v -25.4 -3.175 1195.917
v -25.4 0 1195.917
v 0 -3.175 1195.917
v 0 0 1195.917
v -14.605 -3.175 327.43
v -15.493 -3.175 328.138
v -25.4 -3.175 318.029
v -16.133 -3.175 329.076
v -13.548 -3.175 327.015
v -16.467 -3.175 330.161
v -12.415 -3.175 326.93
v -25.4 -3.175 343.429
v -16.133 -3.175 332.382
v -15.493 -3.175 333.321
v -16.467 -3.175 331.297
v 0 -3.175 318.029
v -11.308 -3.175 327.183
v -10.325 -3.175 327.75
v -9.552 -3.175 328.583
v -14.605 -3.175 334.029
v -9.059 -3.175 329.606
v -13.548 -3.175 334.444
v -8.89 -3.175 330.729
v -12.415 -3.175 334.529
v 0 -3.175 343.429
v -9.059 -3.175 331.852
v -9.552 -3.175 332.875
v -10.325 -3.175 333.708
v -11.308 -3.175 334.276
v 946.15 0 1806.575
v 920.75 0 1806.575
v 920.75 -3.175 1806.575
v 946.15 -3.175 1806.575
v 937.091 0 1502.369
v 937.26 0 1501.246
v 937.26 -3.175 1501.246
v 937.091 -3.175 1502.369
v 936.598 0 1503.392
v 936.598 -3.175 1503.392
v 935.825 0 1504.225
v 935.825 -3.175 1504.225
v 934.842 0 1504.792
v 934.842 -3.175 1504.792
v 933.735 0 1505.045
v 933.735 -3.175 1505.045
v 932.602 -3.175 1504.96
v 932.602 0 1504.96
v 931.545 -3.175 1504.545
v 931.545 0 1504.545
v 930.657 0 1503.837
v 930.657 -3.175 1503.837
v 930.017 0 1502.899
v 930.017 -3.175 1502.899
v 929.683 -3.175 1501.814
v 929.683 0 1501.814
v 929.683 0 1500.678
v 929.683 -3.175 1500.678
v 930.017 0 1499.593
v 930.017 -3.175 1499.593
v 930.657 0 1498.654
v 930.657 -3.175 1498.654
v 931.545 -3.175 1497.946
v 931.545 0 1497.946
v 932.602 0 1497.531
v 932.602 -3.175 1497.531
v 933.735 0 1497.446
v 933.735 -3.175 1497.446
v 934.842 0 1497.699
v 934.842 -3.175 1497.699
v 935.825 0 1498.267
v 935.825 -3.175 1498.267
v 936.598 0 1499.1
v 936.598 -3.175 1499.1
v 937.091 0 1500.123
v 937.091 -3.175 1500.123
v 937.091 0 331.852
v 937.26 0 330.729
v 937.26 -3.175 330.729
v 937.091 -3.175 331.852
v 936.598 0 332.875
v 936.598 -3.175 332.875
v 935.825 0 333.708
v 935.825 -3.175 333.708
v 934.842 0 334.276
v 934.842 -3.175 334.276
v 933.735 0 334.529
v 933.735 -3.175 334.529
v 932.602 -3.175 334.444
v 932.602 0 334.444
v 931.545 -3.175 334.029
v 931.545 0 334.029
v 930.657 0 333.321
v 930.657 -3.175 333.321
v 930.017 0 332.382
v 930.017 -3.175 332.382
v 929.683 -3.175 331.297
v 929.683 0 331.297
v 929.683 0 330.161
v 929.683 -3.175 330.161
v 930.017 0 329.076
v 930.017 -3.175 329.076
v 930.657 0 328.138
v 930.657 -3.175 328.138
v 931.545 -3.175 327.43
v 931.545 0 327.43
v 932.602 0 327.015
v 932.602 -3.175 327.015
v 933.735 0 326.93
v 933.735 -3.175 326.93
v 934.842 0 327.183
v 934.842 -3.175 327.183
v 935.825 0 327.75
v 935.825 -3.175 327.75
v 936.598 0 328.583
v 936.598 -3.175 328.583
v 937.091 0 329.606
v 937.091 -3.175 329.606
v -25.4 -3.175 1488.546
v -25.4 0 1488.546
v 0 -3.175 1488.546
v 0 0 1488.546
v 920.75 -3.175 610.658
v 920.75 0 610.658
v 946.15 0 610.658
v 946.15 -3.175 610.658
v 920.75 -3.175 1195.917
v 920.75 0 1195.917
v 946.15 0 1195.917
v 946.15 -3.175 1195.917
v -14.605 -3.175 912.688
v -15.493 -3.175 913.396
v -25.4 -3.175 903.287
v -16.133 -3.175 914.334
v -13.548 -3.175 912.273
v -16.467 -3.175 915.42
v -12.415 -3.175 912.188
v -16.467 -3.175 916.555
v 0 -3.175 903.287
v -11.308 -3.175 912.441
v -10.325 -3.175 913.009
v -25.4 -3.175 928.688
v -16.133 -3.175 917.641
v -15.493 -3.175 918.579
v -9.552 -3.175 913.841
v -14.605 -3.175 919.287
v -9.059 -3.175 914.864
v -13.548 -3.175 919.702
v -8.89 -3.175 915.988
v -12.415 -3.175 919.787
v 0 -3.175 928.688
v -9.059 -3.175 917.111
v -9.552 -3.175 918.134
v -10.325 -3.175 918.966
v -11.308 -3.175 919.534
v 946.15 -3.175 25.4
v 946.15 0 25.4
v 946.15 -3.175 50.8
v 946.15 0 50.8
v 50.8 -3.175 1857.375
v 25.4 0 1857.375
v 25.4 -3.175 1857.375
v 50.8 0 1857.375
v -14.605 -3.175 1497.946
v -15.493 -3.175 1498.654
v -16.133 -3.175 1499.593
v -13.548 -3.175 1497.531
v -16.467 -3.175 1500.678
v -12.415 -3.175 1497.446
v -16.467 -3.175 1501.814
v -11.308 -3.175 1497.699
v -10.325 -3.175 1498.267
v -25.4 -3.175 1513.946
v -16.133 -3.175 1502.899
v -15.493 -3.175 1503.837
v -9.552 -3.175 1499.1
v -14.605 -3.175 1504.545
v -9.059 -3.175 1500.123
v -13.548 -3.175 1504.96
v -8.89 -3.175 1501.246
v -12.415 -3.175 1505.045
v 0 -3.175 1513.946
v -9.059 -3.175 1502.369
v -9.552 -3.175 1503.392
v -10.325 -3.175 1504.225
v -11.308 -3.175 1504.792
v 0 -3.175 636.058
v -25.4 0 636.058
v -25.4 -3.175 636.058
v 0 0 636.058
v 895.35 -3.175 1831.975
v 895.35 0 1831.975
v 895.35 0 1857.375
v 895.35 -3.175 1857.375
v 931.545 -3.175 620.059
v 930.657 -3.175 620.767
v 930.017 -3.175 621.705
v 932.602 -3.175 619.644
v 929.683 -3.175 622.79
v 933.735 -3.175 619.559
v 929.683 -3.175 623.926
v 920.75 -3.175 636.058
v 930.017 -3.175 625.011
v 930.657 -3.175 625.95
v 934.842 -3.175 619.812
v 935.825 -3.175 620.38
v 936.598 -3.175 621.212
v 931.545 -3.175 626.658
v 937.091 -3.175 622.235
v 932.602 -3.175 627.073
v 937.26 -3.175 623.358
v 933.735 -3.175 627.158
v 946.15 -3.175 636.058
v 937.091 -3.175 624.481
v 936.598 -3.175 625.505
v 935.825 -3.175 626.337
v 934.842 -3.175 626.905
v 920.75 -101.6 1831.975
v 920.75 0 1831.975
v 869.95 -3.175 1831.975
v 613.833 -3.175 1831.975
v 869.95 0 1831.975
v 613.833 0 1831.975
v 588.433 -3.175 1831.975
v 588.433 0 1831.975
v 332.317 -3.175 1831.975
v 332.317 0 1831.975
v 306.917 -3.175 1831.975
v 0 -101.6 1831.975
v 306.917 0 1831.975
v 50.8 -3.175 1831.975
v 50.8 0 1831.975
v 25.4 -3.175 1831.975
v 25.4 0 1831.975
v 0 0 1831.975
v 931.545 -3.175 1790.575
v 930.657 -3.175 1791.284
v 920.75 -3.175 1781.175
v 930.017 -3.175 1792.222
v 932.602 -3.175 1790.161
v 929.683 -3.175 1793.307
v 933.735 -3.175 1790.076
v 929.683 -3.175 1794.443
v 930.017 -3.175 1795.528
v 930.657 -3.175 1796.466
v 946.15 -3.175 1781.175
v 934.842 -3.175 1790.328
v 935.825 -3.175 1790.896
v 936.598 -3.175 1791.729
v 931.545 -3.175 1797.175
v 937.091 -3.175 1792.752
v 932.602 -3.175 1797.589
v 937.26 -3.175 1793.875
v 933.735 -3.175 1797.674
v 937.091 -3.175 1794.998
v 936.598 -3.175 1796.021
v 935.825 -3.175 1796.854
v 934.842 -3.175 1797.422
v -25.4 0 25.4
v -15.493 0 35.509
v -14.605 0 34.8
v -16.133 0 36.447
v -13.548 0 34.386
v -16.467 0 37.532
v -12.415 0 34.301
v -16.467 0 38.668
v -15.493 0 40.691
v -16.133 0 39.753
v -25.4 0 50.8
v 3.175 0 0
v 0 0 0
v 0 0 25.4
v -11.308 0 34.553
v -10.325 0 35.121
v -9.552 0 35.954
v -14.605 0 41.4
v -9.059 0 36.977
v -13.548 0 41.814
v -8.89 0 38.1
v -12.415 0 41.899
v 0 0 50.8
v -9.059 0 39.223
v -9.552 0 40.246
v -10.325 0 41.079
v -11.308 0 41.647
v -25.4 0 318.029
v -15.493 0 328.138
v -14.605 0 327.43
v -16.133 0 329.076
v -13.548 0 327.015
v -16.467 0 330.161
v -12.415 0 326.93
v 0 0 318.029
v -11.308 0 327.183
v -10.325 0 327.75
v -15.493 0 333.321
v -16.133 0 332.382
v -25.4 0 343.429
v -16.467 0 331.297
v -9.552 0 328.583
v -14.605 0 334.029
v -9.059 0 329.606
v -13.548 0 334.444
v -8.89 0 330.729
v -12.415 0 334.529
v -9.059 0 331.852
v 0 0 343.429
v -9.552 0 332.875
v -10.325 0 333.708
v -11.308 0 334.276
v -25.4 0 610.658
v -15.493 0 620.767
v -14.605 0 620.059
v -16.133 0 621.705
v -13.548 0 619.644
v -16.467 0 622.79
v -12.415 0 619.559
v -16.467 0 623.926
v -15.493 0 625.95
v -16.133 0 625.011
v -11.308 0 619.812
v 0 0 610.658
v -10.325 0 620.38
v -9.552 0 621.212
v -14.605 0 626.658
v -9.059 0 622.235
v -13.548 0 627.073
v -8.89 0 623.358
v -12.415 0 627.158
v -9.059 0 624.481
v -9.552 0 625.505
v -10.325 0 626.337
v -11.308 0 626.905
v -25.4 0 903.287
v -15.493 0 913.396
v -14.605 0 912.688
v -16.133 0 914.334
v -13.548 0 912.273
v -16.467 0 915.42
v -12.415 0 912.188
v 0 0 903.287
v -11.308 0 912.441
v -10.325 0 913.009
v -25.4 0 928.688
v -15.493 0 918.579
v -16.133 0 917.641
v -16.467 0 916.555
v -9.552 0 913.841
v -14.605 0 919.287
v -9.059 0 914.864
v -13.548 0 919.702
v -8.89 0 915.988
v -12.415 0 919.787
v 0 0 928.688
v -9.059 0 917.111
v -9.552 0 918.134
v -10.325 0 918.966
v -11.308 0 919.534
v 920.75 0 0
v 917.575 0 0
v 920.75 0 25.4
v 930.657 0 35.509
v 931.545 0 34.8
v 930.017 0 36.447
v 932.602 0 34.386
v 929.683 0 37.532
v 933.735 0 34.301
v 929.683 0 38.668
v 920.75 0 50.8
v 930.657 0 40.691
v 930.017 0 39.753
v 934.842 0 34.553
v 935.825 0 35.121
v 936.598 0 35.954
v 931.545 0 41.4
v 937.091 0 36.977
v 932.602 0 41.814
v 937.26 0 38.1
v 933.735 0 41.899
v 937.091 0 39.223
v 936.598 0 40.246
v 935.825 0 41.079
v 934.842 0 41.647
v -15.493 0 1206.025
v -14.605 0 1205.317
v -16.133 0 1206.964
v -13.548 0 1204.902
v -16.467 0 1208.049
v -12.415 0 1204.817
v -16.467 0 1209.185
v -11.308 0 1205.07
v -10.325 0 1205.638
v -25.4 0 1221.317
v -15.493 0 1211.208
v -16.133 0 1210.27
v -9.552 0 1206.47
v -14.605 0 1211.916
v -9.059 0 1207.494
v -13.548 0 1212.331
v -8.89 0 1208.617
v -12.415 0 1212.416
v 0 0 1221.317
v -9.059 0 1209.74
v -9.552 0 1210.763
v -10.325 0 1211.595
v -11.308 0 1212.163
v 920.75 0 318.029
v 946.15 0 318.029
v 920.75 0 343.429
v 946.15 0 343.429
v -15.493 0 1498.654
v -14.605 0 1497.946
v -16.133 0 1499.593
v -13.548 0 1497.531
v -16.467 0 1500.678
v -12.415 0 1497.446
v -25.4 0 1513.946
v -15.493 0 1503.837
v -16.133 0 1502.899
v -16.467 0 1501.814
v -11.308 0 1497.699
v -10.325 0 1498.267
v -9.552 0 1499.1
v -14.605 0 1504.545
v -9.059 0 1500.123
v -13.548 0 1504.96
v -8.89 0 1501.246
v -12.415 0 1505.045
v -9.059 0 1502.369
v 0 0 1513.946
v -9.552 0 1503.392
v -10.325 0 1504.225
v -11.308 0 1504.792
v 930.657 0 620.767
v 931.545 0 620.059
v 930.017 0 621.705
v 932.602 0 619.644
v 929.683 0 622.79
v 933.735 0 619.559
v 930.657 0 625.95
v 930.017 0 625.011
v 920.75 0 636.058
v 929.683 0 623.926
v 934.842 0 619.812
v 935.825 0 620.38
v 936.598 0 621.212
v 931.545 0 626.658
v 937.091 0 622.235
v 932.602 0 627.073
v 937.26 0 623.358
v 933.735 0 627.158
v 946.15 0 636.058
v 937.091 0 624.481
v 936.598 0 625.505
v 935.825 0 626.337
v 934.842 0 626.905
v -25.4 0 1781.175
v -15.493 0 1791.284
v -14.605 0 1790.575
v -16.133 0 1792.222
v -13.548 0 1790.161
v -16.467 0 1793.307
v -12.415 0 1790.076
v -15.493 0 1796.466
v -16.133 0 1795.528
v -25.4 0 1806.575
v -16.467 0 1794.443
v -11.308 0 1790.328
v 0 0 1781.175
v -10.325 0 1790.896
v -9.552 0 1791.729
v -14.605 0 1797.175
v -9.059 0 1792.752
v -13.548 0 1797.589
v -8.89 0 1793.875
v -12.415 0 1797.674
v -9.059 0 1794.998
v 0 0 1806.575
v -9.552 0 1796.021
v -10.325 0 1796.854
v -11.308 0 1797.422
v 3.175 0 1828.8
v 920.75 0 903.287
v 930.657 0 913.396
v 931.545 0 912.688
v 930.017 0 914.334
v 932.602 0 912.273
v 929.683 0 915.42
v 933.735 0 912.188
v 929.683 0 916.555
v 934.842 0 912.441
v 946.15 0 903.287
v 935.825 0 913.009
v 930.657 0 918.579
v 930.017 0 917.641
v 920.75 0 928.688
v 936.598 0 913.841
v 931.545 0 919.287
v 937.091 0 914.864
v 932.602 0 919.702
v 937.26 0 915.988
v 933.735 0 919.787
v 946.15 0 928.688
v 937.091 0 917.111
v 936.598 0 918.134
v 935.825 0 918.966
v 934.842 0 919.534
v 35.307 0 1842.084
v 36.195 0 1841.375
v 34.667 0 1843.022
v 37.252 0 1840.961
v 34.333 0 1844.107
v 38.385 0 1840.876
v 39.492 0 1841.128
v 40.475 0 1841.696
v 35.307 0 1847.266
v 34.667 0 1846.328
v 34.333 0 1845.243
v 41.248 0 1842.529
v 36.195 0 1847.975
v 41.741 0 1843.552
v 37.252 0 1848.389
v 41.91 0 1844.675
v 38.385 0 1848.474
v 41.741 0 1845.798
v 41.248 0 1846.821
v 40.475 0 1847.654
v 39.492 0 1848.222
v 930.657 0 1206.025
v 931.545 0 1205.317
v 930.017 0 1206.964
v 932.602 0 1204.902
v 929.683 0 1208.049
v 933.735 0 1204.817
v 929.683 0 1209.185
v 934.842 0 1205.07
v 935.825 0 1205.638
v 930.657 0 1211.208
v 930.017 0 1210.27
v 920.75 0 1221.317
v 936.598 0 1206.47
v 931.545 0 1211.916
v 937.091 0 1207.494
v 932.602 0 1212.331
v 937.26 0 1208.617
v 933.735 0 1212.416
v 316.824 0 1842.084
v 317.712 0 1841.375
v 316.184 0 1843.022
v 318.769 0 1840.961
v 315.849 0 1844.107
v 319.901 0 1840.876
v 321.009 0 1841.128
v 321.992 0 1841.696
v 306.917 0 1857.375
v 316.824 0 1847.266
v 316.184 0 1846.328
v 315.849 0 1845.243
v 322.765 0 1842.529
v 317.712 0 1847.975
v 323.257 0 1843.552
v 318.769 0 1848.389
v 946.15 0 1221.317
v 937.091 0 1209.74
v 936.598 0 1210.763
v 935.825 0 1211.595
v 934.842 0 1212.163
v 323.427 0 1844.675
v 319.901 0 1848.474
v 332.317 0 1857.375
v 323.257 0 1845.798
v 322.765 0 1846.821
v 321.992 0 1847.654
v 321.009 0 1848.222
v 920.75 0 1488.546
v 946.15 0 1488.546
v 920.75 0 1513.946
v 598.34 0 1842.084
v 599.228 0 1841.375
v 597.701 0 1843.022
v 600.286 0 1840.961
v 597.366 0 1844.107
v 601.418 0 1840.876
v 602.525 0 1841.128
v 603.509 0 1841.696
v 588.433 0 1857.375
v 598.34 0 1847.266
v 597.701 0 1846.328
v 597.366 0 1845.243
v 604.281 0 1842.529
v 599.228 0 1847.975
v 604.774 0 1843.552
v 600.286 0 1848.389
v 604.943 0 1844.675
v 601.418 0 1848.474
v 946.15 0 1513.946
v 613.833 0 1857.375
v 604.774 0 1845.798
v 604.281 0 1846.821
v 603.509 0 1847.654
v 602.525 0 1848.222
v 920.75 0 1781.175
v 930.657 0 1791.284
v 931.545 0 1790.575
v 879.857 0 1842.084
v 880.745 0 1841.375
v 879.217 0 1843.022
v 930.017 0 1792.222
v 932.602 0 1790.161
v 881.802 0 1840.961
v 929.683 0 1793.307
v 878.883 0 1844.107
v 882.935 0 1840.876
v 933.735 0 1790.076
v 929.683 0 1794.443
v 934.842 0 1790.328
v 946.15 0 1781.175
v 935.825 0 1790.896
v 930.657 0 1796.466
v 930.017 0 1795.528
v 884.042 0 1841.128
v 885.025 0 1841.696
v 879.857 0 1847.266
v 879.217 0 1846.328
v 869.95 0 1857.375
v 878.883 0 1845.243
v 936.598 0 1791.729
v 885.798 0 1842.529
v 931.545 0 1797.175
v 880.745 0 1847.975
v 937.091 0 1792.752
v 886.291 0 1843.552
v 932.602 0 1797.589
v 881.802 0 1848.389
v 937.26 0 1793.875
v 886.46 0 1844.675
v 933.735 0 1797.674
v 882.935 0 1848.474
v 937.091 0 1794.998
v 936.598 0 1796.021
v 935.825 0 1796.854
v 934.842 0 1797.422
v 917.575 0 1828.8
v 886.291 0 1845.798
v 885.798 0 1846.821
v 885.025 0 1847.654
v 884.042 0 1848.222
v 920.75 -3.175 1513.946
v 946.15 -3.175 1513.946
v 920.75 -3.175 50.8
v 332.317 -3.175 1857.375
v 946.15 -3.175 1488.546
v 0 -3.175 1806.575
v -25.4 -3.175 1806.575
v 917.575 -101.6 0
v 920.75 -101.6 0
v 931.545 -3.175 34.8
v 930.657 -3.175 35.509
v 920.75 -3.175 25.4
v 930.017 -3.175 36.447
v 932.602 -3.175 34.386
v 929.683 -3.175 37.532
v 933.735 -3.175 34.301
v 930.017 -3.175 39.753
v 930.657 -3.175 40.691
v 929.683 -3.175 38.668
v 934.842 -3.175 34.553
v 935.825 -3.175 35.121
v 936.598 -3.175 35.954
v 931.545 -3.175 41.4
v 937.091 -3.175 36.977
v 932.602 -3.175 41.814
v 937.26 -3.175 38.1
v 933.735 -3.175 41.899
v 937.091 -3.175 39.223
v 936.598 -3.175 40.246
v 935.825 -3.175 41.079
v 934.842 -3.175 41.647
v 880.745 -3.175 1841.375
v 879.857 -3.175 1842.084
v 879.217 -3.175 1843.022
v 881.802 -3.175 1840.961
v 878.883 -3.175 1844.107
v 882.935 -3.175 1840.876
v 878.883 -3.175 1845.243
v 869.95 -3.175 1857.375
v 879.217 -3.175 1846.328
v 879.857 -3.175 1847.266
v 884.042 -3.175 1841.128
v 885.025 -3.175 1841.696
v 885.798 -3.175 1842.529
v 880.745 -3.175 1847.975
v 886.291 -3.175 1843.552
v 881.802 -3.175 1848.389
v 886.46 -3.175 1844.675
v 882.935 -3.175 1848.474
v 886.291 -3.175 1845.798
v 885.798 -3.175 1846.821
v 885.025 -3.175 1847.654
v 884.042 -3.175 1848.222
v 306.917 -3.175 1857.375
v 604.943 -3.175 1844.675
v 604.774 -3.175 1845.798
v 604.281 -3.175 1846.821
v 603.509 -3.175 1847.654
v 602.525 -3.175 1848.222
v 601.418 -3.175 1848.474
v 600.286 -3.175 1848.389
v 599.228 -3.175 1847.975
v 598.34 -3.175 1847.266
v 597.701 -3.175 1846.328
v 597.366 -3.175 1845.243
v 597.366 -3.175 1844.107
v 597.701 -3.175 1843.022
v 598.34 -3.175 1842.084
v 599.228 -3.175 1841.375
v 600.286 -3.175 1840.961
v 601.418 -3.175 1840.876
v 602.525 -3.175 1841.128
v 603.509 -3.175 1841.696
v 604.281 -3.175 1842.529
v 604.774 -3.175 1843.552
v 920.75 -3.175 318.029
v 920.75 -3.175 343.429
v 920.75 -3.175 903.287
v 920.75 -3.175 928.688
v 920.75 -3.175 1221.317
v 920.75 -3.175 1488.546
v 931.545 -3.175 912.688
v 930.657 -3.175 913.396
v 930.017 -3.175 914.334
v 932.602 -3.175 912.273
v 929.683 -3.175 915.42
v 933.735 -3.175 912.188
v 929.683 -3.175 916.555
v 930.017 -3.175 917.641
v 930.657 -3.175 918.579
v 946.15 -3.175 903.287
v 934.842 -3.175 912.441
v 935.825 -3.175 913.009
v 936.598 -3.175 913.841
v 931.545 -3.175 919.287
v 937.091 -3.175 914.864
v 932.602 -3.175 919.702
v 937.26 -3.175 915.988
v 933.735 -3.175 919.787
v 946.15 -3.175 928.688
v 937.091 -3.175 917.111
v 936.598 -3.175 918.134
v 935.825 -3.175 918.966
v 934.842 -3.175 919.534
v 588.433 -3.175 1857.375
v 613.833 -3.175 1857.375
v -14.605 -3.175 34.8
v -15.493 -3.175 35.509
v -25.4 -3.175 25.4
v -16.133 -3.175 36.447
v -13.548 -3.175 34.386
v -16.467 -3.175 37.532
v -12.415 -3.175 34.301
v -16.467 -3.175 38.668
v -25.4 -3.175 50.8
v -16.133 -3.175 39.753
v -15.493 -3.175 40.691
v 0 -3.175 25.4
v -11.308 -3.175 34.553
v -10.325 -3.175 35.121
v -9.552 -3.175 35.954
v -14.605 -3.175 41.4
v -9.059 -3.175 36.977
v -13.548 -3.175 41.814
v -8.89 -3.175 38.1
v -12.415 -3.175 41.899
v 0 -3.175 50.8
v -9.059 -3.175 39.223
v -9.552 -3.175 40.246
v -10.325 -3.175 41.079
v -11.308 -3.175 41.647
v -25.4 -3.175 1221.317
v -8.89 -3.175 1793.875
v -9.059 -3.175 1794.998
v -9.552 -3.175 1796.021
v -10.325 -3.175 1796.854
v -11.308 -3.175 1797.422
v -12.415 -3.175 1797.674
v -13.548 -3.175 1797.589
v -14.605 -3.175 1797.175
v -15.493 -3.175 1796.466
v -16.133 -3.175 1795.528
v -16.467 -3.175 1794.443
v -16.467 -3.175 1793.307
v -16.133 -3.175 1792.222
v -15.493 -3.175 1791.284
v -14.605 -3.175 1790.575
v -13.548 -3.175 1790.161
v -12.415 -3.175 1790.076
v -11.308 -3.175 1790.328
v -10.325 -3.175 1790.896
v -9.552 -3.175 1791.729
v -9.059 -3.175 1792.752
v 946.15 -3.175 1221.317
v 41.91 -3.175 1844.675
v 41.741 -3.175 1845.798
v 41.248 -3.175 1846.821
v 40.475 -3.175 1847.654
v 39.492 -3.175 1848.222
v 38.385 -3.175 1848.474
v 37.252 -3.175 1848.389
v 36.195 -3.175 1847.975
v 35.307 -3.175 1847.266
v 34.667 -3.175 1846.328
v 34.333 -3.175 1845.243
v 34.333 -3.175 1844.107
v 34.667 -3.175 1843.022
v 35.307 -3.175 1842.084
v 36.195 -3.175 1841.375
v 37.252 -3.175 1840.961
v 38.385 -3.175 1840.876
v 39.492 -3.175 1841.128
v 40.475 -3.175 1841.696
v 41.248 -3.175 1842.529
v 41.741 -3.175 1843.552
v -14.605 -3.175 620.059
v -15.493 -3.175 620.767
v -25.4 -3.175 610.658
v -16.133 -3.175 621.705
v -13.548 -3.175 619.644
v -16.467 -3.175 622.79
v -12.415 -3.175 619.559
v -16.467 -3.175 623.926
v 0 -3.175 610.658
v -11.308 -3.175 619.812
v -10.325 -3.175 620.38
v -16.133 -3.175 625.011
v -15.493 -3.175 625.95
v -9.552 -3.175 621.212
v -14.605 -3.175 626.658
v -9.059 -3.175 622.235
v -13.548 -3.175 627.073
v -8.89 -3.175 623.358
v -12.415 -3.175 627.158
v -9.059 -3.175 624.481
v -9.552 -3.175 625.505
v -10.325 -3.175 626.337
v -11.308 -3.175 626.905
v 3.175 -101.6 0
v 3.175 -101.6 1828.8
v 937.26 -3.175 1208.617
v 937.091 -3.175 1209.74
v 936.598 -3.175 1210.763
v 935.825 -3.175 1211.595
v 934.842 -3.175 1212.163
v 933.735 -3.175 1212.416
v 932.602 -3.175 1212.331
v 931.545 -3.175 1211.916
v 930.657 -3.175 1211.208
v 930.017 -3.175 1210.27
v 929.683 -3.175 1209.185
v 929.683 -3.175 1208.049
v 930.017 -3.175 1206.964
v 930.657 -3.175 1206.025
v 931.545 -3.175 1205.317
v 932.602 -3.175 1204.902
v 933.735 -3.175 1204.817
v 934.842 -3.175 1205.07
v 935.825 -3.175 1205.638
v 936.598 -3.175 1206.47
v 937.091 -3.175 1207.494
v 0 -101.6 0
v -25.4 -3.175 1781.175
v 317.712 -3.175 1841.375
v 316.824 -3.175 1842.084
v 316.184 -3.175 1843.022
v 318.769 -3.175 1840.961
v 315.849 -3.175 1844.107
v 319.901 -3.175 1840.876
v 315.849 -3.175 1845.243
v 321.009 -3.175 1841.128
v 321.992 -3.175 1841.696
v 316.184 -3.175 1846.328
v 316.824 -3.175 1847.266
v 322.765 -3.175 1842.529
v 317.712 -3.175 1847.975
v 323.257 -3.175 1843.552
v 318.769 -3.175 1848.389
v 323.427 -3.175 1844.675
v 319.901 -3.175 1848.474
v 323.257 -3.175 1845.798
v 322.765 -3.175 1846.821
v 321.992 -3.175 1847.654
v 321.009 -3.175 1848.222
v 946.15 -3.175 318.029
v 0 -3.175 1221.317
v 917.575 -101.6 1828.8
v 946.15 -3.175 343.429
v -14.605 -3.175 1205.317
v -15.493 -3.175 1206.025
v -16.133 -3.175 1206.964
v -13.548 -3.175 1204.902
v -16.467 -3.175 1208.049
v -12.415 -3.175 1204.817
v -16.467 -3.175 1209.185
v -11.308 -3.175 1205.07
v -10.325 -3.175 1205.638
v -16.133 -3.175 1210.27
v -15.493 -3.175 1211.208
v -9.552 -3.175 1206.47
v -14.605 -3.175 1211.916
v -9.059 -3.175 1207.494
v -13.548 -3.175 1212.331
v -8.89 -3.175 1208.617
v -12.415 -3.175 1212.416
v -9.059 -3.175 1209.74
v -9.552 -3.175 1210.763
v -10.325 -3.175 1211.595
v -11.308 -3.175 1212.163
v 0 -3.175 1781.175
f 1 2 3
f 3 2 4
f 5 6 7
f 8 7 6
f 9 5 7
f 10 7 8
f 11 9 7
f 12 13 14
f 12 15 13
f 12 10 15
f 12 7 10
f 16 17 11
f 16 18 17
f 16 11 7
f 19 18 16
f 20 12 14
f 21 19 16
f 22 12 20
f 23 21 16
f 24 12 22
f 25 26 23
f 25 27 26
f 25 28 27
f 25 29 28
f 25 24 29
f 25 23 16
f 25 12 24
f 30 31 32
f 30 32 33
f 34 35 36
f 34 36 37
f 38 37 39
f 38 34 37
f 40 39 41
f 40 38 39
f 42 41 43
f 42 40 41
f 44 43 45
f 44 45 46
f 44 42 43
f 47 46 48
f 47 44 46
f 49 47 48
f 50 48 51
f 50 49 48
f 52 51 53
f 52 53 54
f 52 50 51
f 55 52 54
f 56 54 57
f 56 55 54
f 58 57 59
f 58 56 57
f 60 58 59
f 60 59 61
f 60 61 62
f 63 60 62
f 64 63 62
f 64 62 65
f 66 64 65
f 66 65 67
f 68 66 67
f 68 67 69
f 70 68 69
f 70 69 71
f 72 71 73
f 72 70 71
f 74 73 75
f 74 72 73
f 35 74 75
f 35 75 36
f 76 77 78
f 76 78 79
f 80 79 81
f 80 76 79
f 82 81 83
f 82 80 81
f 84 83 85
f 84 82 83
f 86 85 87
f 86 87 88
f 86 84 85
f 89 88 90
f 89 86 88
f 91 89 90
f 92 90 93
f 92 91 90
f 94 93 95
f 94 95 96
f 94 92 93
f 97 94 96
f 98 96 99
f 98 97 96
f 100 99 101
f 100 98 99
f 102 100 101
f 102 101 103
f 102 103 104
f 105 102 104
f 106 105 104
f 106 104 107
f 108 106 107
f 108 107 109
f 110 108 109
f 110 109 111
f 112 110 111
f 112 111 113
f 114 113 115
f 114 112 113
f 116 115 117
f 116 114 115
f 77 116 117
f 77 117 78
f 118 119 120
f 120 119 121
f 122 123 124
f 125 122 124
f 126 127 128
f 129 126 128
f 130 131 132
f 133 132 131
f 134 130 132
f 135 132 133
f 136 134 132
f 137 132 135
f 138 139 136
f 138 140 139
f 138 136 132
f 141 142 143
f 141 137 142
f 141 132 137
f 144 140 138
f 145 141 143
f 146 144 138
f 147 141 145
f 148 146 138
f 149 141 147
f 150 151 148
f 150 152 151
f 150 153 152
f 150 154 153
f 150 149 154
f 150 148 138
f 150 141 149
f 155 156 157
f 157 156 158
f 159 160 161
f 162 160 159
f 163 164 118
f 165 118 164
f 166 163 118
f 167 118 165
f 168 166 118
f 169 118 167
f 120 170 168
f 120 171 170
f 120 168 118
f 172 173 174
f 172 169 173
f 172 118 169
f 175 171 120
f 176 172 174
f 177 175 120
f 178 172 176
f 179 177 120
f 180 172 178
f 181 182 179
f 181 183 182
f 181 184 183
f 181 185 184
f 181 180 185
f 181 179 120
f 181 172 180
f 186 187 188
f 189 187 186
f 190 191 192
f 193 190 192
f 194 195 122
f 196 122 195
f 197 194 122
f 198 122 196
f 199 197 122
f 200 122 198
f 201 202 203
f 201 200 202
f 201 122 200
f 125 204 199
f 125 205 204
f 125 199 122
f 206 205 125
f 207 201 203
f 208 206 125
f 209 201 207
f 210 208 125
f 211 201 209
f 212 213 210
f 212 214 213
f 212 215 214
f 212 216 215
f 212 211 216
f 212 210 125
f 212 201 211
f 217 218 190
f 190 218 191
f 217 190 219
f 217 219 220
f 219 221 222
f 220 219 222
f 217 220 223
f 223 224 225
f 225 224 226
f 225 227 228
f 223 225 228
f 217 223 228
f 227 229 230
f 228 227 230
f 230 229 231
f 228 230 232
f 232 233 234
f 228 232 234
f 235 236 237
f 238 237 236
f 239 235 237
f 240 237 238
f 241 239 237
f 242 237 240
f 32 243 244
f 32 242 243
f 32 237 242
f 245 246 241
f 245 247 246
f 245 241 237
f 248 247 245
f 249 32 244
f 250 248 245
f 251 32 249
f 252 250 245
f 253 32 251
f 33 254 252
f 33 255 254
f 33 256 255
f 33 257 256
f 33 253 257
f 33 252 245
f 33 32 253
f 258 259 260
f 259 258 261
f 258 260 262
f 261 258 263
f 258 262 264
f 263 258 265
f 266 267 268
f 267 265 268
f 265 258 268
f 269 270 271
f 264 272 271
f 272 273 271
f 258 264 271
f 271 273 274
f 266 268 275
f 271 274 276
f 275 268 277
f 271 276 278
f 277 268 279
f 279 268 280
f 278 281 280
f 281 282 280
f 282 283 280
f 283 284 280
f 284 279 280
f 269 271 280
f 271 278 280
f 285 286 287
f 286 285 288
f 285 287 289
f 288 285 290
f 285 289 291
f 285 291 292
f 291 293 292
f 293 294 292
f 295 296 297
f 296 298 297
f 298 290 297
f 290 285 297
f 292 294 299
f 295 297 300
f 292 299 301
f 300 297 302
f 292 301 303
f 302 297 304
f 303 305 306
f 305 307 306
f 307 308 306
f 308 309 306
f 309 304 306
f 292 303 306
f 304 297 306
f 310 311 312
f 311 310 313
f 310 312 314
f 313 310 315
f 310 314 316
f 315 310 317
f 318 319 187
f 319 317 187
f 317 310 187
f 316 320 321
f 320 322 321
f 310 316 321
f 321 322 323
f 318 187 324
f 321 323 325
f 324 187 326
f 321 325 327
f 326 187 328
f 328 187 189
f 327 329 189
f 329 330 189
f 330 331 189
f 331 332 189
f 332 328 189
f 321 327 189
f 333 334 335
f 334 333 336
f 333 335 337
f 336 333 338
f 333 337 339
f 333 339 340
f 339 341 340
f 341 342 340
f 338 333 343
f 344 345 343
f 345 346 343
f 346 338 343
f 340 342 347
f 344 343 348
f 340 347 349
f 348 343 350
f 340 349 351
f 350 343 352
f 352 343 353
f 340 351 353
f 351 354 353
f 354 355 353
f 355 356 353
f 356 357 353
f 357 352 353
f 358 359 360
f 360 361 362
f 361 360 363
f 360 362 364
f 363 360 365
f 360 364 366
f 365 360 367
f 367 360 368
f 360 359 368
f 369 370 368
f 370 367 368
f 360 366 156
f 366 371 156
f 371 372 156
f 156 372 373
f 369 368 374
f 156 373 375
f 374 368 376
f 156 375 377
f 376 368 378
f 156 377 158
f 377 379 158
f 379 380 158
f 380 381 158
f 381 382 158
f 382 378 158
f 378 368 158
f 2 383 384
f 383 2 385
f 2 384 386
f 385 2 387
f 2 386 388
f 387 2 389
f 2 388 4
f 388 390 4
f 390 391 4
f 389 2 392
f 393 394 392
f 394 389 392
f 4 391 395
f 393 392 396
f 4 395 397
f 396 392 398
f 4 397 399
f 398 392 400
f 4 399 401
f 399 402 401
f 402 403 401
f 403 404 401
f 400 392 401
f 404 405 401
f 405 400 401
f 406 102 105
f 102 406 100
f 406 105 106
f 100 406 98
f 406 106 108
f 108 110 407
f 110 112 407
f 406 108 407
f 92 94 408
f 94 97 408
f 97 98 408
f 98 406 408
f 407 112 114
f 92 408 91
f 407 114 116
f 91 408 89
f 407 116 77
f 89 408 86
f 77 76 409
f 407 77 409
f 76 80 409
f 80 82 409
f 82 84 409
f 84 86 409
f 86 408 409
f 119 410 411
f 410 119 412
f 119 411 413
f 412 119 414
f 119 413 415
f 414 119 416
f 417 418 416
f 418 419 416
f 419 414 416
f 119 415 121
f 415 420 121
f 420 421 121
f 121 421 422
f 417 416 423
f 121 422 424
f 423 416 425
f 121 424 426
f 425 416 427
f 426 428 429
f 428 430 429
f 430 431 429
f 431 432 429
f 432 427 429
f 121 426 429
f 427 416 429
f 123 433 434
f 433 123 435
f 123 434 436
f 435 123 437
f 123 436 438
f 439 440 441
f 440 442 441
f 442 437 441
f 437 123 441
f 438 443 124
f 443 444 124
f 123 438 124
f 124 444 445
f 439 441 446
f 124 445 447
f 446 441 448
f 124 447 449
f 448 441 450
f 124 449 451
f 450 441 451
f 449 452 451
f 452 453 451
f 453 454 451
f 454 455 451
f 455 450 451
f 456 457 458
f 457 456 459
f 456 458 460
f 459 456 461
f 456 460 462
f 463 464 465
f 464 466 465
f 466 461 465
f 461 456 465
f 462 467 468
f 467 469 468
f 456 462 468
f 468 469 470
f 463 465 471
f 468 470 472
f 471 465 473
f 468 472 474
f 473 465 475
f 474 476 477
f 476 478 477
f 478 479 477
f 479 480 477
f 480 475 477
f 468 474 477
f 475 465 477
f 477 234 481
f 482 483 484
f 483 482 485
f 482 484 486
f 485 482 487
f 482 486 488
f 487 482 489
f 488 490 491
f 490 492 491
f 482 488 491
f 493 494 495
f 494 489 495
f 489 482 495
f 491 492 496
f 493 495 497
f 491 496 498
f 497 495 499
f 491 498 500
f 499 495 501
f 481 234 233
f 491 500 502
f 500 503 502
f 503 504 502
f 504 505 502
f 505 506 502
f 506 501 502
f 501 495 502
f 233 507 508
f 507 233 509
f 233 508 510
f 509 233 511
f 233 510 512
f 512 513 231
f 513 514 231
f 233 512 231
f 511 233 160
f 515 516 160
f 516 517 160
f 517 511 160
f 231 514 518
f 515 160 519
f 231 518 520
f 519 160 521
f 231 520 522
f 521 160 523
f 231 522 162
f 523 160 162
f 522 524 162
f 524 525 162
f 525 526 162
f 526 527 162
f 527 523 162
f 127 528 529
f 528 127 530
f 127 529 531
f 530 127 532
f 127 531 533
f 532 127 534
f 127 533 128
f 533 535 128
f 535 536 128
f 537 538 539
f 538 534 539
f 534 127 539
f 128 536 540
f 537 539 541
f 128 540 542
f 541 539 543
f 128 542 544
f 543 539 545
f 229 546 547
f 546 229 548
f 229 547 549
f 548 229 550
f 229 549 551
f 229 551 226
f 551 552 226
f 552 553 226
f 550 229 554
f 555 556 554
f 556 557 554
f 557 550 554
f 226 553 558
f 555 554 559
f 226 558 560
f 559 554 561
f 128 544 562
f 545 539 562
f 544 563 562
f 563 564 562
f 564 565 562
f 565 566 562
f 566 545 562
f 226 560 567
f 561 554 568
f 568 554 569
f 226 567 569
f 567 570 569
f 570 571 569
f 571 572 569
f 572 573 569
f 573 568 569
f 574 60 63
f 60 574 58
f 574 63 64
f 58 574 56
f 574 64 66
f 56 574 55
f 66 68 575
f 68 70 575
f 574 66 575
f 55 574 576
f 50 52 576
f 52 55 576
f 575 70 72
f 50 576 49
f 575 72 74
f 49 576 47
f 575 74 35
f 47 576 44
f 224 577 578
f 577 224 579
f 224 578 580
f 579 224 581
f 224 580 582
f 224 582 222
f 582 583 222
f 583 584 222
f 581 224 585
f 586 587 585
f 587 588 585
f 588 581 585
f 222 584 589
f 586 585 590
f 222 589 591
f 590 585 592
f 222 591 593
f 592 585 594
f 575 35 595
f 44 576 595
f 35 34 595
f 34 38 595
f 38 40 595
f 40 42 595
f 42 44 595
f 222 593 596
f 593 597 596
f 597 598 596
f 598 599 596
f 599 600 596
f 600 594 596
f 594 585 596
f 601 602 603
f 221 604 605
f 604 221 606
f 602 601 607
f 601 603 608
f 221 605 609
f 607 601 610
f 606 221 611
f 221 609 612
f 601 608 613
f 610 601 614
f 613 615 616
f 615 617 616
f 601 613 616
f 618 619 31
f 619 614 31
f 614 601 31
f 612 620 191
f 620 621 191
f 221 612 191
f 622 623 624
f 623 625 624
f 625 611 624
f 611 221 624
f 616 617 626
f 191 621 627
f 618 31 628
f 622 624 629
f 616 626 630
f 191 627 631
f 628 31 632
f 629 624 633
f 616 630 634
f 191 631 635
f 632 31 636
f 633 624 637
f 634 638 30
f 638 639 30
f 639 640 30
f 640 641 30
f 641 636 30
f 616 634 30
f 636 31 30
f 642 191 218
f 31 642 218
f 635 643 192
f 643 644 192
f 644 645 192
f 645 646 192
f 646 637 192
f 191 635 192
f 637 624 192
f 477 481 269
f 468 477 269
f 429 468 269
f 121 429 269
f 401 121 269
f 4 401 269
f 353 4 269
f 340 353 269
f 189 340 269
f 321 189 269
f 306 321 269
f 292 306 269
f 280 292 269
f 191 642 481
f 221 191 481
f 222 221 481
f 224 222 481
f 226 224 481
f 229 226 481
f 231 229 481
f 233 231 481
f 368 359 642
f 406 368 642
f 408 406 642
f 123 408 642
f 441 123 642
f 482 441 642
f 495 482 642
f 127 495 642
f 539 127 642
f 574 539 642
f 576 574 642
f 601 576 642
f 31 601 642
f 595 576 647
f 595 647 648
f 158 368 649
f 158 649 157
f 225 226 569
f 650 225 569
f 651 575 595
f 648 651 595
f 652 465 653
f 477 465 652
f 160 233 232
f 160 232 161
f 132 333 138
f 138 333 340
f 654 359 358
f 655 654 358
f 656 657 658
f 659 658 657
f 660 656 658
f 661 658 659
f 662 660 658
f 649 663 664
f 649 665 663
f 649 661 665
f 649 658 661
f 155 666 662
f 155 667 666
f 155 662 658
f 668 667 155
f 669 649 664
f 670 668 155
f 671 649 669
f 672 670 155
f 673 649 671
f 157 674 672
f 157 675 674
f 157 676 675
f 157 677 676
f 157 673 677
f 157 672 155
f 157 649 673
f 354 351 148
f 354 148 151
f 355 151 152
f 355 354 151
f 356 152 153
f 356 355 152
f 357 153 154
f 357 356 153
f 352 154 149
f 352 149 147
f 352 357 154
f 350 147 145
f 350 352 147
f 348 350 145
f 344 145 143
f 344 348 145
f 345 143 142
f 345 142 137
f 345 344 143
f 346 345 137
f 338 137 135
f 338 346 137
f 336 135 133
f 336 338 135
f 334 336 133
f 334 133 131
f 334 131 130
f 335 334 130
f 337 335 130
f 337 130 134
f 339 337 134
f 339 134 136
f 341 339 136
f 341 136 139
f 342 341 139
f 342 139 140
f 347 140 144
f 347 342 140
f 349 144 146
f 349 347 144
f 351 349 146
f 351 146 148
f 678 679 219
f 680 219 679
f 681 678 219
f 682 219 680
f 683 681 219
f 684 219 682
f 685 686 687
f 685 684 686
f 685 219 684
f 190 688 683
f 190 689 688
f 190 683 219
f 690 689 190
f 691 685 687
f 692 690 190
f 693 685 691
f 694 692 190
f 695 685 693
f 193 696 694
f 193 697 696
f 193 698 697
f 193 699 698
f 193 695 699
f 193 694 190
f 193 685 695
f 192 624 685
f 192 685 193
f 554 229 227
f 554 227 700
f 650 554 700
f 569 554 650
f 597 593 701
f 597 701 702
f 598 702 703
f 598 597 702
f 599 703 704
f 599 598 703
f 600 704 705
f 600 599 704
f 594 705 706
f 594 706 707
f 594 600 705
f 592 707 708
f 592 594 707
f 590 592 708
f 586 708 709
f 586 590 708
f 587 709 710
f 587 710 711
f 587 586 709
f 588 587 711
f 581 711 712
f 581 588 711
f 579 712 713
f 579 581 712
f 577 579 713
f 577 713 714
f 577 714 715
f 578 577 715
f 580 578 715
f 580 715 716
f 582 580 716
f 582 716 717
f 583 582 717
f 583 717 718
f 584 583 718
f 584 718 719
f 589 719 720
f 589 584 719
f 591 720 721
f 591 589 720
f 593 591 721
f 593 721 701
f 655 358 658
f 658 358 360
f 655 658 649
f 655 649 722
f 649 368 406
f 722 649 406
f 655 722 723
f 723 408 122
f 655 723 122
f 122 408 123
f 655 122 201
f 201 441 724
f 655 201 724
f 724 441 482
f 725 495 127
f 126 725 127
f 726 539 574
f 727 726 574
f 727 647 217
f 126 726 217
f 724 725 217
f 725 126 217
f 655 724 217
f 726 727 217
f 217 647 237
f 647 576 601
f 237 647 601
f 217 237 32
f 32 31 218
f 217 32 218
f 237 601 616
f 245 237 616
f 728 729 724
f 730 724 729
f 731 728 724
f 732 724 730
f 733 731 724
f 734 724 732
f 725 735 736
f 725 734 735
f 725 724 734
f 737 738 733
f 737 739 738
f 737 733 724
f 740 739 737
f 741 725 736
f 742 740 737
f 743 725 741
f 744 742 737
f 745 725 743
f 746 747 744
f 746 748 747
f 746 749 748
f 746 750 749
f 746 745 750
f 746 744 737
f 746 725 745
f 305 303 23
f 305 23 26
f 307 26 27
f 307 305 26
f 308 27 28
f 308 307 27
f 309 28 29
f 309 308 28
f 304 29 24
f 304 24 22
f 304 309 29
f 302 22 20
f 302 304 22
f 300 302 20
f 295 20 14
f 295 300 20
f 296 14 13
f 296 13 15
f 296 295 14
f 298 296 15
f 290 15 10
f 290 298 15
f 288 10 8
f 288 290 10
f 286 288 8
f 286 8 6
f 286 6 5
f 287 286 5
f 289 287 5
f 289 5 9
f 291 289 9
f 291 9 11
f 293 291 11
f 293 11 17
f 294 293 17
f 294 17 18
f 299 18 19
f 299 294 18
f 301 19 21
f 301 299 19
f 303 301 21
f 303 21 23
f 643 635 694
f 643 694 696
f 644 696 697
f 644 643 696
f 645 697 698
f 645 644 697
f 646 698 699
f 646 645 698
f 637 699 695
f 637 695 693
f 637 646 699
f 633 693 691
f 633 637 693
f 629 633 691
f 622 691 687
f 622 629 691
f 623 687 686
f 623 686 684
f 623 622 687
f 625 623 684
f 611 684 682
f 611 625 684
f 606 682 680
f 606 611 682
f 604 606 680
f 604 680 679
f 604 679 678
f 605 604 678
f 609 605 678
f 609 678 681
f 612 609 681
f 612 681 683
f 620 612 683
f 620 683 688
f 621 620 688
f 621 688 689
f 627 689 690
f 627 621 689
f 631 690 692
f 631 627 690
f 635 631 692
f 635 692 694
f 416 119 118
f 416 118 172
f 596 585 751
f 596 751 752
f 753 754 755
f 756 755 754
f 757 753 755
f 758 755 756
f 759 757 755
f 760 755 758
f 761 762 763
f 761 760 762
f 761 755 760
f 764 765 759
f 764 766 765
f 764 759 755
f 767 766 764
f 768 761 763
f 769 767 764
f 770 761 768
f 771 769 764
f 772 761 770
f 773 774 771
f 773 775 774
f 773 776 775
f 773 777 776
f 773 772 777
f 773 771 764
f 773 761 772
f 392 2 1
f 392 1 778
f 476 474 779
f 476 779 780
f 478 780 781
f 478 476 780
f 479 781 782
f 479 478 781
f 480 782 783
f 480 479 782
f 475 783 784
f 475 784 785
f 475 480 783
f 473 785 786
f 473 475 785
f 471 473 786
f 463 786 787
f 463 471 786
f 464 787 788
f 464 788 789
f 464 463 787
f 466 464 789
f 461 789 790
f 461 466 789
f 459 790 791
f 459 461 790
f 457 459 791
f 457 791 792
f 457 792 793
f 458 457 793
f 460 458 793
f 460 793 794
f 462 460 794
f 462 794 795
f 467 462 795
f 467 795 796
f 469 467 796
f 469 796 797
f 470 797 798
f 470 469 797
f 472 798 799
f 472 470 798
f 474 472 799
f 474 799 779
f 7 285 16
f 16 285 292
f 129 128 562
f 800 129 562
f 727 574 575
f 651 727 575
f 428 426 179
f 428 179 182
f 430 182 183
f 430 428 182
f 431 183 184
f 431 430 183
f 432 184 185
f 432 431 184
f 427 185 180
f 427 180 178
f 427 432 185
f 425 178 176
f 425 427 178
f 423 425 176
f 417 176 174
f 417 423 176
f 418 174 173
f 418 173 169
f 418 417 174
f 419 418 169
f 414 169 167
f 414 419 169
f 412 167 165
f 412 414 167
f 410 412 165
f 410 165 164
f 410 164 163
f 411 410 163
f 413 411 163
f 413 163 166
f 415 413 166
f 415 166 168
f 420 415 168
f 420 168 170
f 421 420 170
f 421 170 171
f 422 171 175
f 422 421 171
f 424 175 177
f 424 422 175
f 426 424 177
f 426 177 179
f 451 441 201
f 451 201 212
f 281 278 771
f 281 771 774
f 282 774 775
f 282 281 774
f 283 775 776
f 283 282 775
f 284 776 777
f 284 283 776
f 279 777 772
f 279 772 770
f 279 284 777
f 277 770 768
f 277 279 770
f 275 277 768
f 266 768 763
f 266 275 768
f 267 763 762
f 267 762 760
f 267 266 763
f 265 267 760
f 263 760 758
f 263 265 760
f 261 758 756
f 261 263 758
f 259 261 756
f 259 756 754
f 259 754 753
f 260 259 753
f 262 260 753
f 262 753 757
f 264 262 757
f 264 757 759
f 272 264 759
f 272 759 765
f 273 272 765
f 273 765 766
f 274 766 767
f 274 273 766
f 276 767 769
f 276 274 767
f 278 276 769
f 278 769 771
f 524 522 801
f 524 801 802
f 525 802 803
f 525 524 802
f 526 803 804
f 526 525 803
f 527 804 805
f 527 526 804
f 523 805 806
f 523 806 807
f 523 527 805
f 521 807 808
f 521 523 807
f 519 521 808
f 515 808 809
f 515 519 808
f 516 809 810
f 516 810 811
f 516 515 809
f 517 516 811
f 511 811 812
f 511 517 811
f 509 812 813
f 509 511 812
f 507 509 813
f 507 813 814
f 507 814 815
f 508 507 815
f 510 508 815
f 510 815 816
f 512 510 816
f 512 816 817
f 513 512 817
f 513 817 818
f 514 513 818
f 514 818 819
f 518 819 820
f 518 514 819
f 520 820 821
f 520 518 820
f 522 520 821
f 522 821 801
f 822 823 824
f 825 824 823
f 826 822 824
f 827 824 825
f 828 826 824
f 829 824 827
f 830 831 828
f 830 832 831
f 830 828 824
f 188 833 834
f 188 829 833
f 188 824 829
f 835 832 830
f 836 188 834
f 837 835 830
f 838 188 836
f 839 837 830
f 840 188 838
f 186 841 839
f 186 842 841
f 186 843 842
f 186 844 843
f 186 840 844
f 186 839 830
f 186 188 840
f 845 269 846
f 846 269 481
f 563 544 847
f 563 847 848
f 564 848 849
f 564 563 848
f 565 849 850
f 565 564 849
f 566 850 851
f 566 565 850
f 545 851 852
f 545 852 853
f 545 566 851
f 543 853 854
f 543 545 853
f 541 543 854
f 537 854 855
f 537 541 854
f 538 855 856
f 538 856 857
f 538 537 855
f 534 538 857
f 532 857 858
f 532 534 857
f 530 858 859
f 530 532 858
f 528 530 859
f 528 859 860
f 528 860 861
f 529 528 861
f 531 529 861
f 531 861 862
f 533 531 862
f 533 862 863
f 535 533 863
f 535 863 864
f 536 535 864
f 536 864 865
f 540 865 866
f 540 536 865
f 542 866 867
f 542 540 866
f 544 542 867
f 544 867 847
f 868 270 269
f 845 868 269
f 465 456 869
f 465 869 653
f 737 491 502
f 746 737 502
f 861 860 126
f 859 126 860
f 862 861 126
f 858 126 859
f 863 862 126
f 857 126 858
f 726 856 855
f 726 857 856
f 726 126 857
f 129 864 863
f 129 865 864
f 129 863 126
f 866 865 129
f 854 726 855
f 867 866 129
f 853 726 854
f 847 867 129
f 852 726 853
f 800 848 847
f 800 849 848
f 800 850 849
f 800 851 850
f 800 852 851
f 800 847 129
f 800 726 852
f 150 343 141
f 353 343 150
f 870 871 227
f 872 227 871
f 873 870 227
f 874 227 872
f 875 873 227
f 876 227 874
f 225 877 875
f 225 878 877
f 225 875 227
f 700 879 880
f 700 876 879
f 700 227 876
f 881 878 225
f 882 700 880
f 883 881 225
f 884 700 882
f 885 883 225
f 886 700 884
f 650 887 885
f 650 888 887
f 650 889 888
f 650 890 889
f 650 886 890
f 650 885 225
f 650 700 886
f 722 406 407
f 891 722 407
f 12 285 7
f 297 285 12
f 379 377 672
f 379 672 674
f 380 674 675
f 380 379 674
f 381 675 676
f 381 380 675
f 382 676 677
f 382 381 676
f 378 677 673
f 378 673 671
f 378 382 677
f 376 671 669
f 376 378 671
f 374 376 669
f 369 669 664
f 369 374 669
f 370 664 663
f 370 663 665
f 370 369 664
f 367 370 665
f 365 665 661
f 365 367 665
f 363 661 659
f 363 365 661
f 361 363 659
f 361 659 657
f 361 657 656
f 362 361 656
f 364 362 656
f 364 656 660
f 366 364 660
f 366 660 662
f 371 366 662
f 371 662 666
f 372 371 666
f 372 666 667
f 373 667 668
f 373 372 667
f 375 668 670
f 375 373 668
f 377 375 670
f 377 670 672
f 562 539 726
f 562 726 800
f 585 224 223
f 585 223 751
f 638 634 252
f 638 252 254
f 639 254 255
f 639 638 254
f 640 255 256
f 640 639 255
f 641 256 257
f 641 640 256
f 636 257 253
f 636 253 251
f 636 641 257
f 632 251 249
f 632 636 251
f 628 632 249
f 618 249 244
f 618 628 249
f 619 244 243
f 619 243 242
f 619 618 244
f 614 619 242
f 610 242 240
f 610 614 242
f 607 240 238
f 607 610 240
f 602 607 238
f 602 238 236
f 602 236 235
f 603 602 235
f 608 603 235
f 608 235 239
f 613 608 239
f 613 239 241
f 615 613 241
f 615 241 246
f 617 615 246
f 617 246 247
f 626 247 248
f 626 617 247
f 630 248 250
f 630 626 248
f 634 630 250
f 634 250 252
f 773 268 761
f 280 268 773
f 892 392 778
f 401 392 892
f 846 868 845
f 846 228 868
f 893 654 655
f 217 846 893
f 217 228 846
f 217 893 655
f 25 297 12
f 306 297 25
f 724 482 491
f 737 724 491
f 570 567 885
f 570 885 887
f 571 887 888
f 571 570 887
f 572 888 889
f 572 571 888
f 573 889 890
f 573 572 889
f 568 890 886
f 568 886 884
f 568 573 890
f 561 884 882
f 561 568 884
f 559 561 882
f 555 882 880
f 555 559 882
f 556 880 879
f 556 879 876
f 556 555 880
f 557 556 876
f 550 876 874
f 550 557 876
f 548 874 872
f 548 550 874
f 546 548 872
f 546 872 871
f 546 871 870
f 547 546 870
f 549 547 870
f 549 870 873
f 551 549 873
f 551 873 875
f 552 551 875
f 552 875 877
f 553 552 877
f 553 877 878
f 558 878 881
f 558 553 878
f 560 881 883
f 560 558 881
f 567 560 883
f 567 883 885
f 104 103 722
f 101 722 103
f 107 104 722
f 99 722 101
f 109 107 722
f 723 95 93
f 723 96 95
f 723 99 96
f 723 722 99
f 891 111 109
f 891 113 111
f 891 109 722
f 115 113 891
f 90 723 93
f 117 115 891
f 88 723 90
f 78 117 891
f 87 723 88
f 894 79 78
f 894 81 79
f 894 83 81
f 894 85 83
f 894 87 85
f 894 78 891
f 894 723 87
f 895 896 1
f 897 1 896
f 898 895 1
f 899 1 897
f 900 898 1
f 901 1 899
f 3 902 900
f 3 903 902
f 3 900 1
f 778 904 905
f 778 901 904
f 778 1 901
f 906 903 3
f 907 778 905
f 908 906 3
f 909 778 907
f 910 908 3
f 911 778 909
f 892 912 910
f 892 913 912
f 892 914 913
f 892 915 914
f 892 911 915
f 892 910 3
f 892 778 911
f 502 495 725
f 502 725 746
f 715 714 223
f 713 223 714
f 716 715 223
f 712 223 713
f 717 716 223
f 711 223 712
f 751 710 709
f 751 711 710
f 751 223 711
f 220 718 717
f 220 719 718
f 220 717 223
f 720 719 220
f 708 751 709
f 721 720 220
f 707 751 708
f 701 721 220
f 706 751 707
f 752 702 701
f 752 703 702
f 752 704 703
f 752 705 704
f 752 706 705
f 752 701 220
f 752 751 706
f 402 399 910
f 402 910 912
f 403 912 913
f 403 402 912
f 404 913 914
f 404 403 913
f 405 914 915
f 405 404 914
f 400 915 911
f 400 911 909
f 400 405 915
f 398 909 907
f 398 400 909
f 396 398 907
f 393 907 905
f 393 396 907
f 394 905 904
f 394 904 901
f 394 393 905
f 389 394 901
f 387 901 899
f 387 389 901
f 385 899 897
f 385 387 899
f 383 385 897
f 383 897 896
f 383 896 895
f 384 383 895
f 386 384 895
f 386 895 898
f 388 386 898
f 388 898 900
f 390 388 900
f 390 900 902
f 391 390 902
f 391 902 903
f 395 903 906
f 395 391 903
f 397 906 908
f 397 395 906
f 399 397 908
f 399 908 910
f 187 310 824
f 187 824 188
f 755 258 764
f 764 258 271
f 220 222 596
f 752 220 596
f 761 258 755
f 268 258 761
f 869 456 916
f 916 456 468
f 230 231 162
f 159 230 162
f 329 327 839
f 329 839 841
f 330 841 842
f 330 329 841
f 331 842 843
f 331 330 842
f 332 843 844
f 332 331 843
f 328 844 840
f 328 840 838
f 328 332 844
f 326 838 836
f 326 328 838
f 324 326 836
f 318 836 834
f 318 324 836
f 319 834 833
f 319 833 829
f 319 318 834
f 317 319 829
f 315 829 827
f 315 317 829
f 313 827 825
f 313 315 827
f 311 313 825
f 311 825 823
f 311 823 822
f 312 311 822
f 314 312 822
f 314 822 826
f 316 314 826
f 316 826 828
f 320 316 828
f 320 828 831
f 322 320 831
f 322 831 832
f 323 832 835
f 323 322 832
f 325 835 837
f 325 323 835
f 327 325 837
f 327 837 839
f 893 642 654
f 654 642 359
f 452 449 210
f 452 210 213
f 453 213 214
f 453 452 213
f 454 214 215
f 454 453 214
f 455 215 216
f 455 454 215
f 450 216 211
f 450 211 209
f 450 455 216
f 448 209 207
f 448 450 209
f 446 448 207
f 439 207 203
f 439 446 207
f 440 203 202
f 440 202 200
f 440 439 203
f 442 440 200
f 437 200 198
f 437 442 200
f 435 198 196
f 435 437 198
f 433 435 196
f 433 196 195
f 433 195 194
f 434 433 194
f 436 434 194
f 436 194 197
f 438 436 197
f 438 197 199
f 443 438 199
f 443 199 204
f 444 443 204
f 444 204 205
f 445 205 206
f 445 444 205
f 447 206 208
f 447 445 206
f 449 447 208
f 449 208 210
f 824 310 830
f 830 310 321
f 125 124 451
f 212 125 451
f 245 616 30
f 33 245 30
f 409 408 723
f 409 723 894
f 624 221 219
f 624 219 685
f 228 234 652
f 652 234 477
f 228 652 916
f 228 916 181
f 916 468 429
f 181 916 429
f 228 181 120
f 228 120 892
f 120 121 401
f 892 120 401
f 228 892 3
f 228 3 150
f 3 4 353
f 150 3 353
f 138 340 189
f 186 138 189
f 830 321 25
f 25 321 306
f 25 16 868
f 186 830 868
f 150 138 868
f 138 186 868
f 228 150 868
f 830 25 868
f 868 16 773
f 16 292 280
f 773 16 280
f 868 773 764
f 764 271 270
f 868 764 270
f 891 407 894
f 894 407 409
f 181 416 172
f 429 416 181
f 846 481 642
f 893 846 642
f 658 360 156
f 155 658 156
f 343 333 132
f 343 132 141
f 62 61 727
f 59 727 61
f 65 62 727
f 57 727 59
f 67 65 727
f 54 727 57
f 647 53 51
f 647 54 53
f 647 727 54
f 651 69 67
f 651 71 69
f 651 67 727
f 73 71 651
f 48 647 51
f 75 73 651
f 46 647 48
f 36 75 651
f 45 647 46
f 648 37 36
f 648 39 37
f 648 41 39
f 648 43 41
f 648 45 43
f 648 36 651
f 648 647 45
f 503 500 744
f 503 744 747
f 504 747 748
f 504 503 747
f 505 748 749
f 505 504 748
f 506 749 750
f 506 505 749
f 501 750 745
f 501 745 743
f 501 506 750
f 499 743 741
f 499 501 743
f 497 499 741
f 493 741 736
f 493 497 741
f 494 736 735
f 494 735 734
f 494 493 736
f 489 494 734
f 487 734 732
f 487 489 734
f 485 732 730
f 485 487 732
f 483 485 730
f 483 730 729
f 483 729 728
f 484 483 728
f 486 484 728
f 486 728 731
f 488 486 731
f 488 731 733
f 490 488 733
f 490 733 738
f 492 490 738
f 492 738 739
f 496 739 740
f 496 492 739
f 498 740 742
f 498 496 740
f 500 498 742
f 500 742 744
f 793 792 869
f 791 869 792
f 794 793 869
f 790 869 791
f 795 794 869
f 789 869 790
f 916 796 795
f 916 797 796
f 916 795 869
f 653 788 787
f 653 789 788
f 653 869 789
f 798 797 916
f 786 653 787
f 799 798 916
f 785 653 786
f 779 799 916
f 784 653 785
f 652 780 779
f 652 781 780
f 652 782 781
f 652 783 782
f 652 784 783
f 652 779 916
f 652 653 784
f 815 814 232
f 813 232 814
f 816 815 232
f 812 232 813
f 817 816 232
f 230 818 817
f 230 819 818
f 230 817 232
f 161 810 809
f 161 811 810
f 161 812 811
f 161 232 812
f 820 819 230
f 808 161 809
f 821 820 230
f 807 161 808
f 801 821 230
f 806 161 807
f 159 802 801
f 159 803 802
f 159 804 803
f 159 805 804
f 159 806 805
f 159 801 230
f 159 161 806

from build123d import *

# Parameters (mm, degrees)
F1_DEPTH = 101.6
F0_W     = 25.4
F0_H     = 25.4
F0_R     = 3.81
F2_DEPTH = 3.175


# Not quite as in the source:
# - a feature names something its author has since deleted; it is built from what else it names


with BuildPart() as f1:
    # F0 (on Front) → F1 (new body)
    with BuildSketch(Plane.XZ):
        Polygon((0, 25.4), (0, 0), (3.175, 0), (3.175, 1828.8), (917.575, 1828.8), (917.575, 0), (920.75, 0), (920.75, 25.4), (920.75, 50.8), (920.75, 318.0291666667), (920.75, 343.4291666667), (920.75, 610.6583333333), (920.75, 636.0583333333), (920.75, 903.2875), (920.75, 928.6875), (920.75, 1195.9166666667), (920.75, 1221.3166666667), (920.75, 1488.5458333333), (920.75, 1513.9458333333), (920.75, 1781.175), (920.75, 1806.575), (920.75, 1831.975), (895.35, 1831.975), (869.95, 1831.975), (613.8333333333, 1831.975), (588.4333333333, 1831.975), (332.3166666667, 1831.975), (306.9166666667, 1831.975), (50.8, 1831.975), (25.4, 1831.975), (0, 1831.975), (0, 1806.575), (0, 1781.175), (0, 1513.9458333333), (0, 1488.5458333333), (0, 1221.3166666667), (0, 1195.9166666667), (0, 928.6875), (0, 903.2875), (0, 636.0583333333), (0, 610.6583333333), (0, 343.4291666667), (0, 318.0291666667), (0, 50.8), align=None)
    extrude(amount=F1_DEPTH)

    # F0 (on Front) → F2 (join)
    with BuildSketch(Plane.XZ):
        with Locations((-12.7, 38.1)):
            Rectangle(F0_W, F0_H)
        with Locations((-12.7, 38.1)):
            Circle(F0_R, mode=Mode.SUBTRACT)
        with Locations((-12.7, 330.7291666667)):
            Rectangle(F0_W, F0_H)
        with Locations((-12.7, 330.7291666667)):
            Circle(F0_R, mode=Mode.SUBTRACT)
        with Locations((-12.7, 623.3583333333)):
            Rectangle(F0_W, F0_H)
        with Locations((-12.7, 623.3583333333)):
            Circle(F0_R, mode=Mode.SUBTRACT)
        with Locations((933.45, 38.1)):
            Rectangle(F0_W, F0_H)
        with Locations((933.45, 38.1)):
            Circle(F0_R, mode=Mode.SUBTRACT)
        with Locations((-12.7, 915.9875)):
            Rectangle(F0_W, F0_H)
        with Locations((-12.7, 915.9875)):
            Circle(F0_R, mode=Mode.SUBTRACT)
        with Locations((933.45, 330.7291666667)):
            Rectangle(F0_W, F0_H)
        with Locations((933.45, 330.7291666667)):
            Circle(F0_R, mode=Mode.SUBTRACT)
        with Locations((-12.7, 1208.6166666667)):
            Rectangle(F0_W, F0_H)
        with Locations((-12.7, 1208.6166666667)):
            Circle(F0_R, mode=Mode.SUBTRACT)
        with Locations((933.45, 623.3583333333)):
            Rectangle(F0_W, F0_H)
        with Locations((933.45, 623.3583333333)):
            Circle(F0_R, mode=Mode.SUBTRACT)
        with Locations((-12.7, 1501.2458333333)):
            Rectangle(F0_W, F0_H)
        with Locations((-12.7, 1501.2458333333)):
            Circle(F0_R, mode=Mode.SUBTRACT)
        with Locations((933.45, 915.9875)):
            Rectangle(F0_W, F0_H)
        with Locations((933.45, 915.9875)):
            Circle(F0_R, mode=Mode.SUBTRACT)
        with Locations((-12.7, 1793.875)):
            Rectangle(F0_W, F0_H)
        with Locations((-12.7, 1793.875)):
            Circle(F0_R, mode=Mode.SUBTRACT)
        with Locations((933.45, 1208.6166666667)):
            Rectangle(F0_W, F0_H)
        with Locations((933.45, 1208.6166666667)):
            Circle(F0_R, mode=Mode.SUBTRACT)
        with Locations((38.1, 1844.675)):
            Rectangle(F0_W, F0_H)
        with Locations((38.1, 1844.675)):
            Circle(F0_R, mode=Mode.SUBTRACT)
        with Locations((933.45, 1501.2458333333)):
            Rectangle(F0_W, F0_H)
        with Locations((933.45, 1501.2458333333)):
            Circle(F0_R, mode=Mode.SUBTRACT)
        with Locations((319.6166666667, 1844.675)):
            Rectangle(F0_W, F0_H)
        with Locations((319.6166666667, 1844.675)):
            Circle(F0_R, mode=Mode.SUBTRACT)
        with Locations((933.45, 1793.875)):
            Rectangle(F0_W, F0_H)
        with Locations((933.45, 1793.875)):
            Circle(F0_R, mode=Mode.SUBTRACT)
        with Locations((601.1333333333, 1844.675)):
            Rectangle(F0_W, F0_H)
        with Locations((601.1333333333, 1844.675)):
            Circle(F0_R, mode=Mode.SUBTRACT)
        with Locations((882.65, 1844.675)):
            Rectangle(F0_W, F0_H)
        with Locations((882.65, 1844.675)):
            Circle(F0_R, mode=Mode.SUBTRACT)
    extrude(amount=F2_DEPTH)


solid = f1.part
